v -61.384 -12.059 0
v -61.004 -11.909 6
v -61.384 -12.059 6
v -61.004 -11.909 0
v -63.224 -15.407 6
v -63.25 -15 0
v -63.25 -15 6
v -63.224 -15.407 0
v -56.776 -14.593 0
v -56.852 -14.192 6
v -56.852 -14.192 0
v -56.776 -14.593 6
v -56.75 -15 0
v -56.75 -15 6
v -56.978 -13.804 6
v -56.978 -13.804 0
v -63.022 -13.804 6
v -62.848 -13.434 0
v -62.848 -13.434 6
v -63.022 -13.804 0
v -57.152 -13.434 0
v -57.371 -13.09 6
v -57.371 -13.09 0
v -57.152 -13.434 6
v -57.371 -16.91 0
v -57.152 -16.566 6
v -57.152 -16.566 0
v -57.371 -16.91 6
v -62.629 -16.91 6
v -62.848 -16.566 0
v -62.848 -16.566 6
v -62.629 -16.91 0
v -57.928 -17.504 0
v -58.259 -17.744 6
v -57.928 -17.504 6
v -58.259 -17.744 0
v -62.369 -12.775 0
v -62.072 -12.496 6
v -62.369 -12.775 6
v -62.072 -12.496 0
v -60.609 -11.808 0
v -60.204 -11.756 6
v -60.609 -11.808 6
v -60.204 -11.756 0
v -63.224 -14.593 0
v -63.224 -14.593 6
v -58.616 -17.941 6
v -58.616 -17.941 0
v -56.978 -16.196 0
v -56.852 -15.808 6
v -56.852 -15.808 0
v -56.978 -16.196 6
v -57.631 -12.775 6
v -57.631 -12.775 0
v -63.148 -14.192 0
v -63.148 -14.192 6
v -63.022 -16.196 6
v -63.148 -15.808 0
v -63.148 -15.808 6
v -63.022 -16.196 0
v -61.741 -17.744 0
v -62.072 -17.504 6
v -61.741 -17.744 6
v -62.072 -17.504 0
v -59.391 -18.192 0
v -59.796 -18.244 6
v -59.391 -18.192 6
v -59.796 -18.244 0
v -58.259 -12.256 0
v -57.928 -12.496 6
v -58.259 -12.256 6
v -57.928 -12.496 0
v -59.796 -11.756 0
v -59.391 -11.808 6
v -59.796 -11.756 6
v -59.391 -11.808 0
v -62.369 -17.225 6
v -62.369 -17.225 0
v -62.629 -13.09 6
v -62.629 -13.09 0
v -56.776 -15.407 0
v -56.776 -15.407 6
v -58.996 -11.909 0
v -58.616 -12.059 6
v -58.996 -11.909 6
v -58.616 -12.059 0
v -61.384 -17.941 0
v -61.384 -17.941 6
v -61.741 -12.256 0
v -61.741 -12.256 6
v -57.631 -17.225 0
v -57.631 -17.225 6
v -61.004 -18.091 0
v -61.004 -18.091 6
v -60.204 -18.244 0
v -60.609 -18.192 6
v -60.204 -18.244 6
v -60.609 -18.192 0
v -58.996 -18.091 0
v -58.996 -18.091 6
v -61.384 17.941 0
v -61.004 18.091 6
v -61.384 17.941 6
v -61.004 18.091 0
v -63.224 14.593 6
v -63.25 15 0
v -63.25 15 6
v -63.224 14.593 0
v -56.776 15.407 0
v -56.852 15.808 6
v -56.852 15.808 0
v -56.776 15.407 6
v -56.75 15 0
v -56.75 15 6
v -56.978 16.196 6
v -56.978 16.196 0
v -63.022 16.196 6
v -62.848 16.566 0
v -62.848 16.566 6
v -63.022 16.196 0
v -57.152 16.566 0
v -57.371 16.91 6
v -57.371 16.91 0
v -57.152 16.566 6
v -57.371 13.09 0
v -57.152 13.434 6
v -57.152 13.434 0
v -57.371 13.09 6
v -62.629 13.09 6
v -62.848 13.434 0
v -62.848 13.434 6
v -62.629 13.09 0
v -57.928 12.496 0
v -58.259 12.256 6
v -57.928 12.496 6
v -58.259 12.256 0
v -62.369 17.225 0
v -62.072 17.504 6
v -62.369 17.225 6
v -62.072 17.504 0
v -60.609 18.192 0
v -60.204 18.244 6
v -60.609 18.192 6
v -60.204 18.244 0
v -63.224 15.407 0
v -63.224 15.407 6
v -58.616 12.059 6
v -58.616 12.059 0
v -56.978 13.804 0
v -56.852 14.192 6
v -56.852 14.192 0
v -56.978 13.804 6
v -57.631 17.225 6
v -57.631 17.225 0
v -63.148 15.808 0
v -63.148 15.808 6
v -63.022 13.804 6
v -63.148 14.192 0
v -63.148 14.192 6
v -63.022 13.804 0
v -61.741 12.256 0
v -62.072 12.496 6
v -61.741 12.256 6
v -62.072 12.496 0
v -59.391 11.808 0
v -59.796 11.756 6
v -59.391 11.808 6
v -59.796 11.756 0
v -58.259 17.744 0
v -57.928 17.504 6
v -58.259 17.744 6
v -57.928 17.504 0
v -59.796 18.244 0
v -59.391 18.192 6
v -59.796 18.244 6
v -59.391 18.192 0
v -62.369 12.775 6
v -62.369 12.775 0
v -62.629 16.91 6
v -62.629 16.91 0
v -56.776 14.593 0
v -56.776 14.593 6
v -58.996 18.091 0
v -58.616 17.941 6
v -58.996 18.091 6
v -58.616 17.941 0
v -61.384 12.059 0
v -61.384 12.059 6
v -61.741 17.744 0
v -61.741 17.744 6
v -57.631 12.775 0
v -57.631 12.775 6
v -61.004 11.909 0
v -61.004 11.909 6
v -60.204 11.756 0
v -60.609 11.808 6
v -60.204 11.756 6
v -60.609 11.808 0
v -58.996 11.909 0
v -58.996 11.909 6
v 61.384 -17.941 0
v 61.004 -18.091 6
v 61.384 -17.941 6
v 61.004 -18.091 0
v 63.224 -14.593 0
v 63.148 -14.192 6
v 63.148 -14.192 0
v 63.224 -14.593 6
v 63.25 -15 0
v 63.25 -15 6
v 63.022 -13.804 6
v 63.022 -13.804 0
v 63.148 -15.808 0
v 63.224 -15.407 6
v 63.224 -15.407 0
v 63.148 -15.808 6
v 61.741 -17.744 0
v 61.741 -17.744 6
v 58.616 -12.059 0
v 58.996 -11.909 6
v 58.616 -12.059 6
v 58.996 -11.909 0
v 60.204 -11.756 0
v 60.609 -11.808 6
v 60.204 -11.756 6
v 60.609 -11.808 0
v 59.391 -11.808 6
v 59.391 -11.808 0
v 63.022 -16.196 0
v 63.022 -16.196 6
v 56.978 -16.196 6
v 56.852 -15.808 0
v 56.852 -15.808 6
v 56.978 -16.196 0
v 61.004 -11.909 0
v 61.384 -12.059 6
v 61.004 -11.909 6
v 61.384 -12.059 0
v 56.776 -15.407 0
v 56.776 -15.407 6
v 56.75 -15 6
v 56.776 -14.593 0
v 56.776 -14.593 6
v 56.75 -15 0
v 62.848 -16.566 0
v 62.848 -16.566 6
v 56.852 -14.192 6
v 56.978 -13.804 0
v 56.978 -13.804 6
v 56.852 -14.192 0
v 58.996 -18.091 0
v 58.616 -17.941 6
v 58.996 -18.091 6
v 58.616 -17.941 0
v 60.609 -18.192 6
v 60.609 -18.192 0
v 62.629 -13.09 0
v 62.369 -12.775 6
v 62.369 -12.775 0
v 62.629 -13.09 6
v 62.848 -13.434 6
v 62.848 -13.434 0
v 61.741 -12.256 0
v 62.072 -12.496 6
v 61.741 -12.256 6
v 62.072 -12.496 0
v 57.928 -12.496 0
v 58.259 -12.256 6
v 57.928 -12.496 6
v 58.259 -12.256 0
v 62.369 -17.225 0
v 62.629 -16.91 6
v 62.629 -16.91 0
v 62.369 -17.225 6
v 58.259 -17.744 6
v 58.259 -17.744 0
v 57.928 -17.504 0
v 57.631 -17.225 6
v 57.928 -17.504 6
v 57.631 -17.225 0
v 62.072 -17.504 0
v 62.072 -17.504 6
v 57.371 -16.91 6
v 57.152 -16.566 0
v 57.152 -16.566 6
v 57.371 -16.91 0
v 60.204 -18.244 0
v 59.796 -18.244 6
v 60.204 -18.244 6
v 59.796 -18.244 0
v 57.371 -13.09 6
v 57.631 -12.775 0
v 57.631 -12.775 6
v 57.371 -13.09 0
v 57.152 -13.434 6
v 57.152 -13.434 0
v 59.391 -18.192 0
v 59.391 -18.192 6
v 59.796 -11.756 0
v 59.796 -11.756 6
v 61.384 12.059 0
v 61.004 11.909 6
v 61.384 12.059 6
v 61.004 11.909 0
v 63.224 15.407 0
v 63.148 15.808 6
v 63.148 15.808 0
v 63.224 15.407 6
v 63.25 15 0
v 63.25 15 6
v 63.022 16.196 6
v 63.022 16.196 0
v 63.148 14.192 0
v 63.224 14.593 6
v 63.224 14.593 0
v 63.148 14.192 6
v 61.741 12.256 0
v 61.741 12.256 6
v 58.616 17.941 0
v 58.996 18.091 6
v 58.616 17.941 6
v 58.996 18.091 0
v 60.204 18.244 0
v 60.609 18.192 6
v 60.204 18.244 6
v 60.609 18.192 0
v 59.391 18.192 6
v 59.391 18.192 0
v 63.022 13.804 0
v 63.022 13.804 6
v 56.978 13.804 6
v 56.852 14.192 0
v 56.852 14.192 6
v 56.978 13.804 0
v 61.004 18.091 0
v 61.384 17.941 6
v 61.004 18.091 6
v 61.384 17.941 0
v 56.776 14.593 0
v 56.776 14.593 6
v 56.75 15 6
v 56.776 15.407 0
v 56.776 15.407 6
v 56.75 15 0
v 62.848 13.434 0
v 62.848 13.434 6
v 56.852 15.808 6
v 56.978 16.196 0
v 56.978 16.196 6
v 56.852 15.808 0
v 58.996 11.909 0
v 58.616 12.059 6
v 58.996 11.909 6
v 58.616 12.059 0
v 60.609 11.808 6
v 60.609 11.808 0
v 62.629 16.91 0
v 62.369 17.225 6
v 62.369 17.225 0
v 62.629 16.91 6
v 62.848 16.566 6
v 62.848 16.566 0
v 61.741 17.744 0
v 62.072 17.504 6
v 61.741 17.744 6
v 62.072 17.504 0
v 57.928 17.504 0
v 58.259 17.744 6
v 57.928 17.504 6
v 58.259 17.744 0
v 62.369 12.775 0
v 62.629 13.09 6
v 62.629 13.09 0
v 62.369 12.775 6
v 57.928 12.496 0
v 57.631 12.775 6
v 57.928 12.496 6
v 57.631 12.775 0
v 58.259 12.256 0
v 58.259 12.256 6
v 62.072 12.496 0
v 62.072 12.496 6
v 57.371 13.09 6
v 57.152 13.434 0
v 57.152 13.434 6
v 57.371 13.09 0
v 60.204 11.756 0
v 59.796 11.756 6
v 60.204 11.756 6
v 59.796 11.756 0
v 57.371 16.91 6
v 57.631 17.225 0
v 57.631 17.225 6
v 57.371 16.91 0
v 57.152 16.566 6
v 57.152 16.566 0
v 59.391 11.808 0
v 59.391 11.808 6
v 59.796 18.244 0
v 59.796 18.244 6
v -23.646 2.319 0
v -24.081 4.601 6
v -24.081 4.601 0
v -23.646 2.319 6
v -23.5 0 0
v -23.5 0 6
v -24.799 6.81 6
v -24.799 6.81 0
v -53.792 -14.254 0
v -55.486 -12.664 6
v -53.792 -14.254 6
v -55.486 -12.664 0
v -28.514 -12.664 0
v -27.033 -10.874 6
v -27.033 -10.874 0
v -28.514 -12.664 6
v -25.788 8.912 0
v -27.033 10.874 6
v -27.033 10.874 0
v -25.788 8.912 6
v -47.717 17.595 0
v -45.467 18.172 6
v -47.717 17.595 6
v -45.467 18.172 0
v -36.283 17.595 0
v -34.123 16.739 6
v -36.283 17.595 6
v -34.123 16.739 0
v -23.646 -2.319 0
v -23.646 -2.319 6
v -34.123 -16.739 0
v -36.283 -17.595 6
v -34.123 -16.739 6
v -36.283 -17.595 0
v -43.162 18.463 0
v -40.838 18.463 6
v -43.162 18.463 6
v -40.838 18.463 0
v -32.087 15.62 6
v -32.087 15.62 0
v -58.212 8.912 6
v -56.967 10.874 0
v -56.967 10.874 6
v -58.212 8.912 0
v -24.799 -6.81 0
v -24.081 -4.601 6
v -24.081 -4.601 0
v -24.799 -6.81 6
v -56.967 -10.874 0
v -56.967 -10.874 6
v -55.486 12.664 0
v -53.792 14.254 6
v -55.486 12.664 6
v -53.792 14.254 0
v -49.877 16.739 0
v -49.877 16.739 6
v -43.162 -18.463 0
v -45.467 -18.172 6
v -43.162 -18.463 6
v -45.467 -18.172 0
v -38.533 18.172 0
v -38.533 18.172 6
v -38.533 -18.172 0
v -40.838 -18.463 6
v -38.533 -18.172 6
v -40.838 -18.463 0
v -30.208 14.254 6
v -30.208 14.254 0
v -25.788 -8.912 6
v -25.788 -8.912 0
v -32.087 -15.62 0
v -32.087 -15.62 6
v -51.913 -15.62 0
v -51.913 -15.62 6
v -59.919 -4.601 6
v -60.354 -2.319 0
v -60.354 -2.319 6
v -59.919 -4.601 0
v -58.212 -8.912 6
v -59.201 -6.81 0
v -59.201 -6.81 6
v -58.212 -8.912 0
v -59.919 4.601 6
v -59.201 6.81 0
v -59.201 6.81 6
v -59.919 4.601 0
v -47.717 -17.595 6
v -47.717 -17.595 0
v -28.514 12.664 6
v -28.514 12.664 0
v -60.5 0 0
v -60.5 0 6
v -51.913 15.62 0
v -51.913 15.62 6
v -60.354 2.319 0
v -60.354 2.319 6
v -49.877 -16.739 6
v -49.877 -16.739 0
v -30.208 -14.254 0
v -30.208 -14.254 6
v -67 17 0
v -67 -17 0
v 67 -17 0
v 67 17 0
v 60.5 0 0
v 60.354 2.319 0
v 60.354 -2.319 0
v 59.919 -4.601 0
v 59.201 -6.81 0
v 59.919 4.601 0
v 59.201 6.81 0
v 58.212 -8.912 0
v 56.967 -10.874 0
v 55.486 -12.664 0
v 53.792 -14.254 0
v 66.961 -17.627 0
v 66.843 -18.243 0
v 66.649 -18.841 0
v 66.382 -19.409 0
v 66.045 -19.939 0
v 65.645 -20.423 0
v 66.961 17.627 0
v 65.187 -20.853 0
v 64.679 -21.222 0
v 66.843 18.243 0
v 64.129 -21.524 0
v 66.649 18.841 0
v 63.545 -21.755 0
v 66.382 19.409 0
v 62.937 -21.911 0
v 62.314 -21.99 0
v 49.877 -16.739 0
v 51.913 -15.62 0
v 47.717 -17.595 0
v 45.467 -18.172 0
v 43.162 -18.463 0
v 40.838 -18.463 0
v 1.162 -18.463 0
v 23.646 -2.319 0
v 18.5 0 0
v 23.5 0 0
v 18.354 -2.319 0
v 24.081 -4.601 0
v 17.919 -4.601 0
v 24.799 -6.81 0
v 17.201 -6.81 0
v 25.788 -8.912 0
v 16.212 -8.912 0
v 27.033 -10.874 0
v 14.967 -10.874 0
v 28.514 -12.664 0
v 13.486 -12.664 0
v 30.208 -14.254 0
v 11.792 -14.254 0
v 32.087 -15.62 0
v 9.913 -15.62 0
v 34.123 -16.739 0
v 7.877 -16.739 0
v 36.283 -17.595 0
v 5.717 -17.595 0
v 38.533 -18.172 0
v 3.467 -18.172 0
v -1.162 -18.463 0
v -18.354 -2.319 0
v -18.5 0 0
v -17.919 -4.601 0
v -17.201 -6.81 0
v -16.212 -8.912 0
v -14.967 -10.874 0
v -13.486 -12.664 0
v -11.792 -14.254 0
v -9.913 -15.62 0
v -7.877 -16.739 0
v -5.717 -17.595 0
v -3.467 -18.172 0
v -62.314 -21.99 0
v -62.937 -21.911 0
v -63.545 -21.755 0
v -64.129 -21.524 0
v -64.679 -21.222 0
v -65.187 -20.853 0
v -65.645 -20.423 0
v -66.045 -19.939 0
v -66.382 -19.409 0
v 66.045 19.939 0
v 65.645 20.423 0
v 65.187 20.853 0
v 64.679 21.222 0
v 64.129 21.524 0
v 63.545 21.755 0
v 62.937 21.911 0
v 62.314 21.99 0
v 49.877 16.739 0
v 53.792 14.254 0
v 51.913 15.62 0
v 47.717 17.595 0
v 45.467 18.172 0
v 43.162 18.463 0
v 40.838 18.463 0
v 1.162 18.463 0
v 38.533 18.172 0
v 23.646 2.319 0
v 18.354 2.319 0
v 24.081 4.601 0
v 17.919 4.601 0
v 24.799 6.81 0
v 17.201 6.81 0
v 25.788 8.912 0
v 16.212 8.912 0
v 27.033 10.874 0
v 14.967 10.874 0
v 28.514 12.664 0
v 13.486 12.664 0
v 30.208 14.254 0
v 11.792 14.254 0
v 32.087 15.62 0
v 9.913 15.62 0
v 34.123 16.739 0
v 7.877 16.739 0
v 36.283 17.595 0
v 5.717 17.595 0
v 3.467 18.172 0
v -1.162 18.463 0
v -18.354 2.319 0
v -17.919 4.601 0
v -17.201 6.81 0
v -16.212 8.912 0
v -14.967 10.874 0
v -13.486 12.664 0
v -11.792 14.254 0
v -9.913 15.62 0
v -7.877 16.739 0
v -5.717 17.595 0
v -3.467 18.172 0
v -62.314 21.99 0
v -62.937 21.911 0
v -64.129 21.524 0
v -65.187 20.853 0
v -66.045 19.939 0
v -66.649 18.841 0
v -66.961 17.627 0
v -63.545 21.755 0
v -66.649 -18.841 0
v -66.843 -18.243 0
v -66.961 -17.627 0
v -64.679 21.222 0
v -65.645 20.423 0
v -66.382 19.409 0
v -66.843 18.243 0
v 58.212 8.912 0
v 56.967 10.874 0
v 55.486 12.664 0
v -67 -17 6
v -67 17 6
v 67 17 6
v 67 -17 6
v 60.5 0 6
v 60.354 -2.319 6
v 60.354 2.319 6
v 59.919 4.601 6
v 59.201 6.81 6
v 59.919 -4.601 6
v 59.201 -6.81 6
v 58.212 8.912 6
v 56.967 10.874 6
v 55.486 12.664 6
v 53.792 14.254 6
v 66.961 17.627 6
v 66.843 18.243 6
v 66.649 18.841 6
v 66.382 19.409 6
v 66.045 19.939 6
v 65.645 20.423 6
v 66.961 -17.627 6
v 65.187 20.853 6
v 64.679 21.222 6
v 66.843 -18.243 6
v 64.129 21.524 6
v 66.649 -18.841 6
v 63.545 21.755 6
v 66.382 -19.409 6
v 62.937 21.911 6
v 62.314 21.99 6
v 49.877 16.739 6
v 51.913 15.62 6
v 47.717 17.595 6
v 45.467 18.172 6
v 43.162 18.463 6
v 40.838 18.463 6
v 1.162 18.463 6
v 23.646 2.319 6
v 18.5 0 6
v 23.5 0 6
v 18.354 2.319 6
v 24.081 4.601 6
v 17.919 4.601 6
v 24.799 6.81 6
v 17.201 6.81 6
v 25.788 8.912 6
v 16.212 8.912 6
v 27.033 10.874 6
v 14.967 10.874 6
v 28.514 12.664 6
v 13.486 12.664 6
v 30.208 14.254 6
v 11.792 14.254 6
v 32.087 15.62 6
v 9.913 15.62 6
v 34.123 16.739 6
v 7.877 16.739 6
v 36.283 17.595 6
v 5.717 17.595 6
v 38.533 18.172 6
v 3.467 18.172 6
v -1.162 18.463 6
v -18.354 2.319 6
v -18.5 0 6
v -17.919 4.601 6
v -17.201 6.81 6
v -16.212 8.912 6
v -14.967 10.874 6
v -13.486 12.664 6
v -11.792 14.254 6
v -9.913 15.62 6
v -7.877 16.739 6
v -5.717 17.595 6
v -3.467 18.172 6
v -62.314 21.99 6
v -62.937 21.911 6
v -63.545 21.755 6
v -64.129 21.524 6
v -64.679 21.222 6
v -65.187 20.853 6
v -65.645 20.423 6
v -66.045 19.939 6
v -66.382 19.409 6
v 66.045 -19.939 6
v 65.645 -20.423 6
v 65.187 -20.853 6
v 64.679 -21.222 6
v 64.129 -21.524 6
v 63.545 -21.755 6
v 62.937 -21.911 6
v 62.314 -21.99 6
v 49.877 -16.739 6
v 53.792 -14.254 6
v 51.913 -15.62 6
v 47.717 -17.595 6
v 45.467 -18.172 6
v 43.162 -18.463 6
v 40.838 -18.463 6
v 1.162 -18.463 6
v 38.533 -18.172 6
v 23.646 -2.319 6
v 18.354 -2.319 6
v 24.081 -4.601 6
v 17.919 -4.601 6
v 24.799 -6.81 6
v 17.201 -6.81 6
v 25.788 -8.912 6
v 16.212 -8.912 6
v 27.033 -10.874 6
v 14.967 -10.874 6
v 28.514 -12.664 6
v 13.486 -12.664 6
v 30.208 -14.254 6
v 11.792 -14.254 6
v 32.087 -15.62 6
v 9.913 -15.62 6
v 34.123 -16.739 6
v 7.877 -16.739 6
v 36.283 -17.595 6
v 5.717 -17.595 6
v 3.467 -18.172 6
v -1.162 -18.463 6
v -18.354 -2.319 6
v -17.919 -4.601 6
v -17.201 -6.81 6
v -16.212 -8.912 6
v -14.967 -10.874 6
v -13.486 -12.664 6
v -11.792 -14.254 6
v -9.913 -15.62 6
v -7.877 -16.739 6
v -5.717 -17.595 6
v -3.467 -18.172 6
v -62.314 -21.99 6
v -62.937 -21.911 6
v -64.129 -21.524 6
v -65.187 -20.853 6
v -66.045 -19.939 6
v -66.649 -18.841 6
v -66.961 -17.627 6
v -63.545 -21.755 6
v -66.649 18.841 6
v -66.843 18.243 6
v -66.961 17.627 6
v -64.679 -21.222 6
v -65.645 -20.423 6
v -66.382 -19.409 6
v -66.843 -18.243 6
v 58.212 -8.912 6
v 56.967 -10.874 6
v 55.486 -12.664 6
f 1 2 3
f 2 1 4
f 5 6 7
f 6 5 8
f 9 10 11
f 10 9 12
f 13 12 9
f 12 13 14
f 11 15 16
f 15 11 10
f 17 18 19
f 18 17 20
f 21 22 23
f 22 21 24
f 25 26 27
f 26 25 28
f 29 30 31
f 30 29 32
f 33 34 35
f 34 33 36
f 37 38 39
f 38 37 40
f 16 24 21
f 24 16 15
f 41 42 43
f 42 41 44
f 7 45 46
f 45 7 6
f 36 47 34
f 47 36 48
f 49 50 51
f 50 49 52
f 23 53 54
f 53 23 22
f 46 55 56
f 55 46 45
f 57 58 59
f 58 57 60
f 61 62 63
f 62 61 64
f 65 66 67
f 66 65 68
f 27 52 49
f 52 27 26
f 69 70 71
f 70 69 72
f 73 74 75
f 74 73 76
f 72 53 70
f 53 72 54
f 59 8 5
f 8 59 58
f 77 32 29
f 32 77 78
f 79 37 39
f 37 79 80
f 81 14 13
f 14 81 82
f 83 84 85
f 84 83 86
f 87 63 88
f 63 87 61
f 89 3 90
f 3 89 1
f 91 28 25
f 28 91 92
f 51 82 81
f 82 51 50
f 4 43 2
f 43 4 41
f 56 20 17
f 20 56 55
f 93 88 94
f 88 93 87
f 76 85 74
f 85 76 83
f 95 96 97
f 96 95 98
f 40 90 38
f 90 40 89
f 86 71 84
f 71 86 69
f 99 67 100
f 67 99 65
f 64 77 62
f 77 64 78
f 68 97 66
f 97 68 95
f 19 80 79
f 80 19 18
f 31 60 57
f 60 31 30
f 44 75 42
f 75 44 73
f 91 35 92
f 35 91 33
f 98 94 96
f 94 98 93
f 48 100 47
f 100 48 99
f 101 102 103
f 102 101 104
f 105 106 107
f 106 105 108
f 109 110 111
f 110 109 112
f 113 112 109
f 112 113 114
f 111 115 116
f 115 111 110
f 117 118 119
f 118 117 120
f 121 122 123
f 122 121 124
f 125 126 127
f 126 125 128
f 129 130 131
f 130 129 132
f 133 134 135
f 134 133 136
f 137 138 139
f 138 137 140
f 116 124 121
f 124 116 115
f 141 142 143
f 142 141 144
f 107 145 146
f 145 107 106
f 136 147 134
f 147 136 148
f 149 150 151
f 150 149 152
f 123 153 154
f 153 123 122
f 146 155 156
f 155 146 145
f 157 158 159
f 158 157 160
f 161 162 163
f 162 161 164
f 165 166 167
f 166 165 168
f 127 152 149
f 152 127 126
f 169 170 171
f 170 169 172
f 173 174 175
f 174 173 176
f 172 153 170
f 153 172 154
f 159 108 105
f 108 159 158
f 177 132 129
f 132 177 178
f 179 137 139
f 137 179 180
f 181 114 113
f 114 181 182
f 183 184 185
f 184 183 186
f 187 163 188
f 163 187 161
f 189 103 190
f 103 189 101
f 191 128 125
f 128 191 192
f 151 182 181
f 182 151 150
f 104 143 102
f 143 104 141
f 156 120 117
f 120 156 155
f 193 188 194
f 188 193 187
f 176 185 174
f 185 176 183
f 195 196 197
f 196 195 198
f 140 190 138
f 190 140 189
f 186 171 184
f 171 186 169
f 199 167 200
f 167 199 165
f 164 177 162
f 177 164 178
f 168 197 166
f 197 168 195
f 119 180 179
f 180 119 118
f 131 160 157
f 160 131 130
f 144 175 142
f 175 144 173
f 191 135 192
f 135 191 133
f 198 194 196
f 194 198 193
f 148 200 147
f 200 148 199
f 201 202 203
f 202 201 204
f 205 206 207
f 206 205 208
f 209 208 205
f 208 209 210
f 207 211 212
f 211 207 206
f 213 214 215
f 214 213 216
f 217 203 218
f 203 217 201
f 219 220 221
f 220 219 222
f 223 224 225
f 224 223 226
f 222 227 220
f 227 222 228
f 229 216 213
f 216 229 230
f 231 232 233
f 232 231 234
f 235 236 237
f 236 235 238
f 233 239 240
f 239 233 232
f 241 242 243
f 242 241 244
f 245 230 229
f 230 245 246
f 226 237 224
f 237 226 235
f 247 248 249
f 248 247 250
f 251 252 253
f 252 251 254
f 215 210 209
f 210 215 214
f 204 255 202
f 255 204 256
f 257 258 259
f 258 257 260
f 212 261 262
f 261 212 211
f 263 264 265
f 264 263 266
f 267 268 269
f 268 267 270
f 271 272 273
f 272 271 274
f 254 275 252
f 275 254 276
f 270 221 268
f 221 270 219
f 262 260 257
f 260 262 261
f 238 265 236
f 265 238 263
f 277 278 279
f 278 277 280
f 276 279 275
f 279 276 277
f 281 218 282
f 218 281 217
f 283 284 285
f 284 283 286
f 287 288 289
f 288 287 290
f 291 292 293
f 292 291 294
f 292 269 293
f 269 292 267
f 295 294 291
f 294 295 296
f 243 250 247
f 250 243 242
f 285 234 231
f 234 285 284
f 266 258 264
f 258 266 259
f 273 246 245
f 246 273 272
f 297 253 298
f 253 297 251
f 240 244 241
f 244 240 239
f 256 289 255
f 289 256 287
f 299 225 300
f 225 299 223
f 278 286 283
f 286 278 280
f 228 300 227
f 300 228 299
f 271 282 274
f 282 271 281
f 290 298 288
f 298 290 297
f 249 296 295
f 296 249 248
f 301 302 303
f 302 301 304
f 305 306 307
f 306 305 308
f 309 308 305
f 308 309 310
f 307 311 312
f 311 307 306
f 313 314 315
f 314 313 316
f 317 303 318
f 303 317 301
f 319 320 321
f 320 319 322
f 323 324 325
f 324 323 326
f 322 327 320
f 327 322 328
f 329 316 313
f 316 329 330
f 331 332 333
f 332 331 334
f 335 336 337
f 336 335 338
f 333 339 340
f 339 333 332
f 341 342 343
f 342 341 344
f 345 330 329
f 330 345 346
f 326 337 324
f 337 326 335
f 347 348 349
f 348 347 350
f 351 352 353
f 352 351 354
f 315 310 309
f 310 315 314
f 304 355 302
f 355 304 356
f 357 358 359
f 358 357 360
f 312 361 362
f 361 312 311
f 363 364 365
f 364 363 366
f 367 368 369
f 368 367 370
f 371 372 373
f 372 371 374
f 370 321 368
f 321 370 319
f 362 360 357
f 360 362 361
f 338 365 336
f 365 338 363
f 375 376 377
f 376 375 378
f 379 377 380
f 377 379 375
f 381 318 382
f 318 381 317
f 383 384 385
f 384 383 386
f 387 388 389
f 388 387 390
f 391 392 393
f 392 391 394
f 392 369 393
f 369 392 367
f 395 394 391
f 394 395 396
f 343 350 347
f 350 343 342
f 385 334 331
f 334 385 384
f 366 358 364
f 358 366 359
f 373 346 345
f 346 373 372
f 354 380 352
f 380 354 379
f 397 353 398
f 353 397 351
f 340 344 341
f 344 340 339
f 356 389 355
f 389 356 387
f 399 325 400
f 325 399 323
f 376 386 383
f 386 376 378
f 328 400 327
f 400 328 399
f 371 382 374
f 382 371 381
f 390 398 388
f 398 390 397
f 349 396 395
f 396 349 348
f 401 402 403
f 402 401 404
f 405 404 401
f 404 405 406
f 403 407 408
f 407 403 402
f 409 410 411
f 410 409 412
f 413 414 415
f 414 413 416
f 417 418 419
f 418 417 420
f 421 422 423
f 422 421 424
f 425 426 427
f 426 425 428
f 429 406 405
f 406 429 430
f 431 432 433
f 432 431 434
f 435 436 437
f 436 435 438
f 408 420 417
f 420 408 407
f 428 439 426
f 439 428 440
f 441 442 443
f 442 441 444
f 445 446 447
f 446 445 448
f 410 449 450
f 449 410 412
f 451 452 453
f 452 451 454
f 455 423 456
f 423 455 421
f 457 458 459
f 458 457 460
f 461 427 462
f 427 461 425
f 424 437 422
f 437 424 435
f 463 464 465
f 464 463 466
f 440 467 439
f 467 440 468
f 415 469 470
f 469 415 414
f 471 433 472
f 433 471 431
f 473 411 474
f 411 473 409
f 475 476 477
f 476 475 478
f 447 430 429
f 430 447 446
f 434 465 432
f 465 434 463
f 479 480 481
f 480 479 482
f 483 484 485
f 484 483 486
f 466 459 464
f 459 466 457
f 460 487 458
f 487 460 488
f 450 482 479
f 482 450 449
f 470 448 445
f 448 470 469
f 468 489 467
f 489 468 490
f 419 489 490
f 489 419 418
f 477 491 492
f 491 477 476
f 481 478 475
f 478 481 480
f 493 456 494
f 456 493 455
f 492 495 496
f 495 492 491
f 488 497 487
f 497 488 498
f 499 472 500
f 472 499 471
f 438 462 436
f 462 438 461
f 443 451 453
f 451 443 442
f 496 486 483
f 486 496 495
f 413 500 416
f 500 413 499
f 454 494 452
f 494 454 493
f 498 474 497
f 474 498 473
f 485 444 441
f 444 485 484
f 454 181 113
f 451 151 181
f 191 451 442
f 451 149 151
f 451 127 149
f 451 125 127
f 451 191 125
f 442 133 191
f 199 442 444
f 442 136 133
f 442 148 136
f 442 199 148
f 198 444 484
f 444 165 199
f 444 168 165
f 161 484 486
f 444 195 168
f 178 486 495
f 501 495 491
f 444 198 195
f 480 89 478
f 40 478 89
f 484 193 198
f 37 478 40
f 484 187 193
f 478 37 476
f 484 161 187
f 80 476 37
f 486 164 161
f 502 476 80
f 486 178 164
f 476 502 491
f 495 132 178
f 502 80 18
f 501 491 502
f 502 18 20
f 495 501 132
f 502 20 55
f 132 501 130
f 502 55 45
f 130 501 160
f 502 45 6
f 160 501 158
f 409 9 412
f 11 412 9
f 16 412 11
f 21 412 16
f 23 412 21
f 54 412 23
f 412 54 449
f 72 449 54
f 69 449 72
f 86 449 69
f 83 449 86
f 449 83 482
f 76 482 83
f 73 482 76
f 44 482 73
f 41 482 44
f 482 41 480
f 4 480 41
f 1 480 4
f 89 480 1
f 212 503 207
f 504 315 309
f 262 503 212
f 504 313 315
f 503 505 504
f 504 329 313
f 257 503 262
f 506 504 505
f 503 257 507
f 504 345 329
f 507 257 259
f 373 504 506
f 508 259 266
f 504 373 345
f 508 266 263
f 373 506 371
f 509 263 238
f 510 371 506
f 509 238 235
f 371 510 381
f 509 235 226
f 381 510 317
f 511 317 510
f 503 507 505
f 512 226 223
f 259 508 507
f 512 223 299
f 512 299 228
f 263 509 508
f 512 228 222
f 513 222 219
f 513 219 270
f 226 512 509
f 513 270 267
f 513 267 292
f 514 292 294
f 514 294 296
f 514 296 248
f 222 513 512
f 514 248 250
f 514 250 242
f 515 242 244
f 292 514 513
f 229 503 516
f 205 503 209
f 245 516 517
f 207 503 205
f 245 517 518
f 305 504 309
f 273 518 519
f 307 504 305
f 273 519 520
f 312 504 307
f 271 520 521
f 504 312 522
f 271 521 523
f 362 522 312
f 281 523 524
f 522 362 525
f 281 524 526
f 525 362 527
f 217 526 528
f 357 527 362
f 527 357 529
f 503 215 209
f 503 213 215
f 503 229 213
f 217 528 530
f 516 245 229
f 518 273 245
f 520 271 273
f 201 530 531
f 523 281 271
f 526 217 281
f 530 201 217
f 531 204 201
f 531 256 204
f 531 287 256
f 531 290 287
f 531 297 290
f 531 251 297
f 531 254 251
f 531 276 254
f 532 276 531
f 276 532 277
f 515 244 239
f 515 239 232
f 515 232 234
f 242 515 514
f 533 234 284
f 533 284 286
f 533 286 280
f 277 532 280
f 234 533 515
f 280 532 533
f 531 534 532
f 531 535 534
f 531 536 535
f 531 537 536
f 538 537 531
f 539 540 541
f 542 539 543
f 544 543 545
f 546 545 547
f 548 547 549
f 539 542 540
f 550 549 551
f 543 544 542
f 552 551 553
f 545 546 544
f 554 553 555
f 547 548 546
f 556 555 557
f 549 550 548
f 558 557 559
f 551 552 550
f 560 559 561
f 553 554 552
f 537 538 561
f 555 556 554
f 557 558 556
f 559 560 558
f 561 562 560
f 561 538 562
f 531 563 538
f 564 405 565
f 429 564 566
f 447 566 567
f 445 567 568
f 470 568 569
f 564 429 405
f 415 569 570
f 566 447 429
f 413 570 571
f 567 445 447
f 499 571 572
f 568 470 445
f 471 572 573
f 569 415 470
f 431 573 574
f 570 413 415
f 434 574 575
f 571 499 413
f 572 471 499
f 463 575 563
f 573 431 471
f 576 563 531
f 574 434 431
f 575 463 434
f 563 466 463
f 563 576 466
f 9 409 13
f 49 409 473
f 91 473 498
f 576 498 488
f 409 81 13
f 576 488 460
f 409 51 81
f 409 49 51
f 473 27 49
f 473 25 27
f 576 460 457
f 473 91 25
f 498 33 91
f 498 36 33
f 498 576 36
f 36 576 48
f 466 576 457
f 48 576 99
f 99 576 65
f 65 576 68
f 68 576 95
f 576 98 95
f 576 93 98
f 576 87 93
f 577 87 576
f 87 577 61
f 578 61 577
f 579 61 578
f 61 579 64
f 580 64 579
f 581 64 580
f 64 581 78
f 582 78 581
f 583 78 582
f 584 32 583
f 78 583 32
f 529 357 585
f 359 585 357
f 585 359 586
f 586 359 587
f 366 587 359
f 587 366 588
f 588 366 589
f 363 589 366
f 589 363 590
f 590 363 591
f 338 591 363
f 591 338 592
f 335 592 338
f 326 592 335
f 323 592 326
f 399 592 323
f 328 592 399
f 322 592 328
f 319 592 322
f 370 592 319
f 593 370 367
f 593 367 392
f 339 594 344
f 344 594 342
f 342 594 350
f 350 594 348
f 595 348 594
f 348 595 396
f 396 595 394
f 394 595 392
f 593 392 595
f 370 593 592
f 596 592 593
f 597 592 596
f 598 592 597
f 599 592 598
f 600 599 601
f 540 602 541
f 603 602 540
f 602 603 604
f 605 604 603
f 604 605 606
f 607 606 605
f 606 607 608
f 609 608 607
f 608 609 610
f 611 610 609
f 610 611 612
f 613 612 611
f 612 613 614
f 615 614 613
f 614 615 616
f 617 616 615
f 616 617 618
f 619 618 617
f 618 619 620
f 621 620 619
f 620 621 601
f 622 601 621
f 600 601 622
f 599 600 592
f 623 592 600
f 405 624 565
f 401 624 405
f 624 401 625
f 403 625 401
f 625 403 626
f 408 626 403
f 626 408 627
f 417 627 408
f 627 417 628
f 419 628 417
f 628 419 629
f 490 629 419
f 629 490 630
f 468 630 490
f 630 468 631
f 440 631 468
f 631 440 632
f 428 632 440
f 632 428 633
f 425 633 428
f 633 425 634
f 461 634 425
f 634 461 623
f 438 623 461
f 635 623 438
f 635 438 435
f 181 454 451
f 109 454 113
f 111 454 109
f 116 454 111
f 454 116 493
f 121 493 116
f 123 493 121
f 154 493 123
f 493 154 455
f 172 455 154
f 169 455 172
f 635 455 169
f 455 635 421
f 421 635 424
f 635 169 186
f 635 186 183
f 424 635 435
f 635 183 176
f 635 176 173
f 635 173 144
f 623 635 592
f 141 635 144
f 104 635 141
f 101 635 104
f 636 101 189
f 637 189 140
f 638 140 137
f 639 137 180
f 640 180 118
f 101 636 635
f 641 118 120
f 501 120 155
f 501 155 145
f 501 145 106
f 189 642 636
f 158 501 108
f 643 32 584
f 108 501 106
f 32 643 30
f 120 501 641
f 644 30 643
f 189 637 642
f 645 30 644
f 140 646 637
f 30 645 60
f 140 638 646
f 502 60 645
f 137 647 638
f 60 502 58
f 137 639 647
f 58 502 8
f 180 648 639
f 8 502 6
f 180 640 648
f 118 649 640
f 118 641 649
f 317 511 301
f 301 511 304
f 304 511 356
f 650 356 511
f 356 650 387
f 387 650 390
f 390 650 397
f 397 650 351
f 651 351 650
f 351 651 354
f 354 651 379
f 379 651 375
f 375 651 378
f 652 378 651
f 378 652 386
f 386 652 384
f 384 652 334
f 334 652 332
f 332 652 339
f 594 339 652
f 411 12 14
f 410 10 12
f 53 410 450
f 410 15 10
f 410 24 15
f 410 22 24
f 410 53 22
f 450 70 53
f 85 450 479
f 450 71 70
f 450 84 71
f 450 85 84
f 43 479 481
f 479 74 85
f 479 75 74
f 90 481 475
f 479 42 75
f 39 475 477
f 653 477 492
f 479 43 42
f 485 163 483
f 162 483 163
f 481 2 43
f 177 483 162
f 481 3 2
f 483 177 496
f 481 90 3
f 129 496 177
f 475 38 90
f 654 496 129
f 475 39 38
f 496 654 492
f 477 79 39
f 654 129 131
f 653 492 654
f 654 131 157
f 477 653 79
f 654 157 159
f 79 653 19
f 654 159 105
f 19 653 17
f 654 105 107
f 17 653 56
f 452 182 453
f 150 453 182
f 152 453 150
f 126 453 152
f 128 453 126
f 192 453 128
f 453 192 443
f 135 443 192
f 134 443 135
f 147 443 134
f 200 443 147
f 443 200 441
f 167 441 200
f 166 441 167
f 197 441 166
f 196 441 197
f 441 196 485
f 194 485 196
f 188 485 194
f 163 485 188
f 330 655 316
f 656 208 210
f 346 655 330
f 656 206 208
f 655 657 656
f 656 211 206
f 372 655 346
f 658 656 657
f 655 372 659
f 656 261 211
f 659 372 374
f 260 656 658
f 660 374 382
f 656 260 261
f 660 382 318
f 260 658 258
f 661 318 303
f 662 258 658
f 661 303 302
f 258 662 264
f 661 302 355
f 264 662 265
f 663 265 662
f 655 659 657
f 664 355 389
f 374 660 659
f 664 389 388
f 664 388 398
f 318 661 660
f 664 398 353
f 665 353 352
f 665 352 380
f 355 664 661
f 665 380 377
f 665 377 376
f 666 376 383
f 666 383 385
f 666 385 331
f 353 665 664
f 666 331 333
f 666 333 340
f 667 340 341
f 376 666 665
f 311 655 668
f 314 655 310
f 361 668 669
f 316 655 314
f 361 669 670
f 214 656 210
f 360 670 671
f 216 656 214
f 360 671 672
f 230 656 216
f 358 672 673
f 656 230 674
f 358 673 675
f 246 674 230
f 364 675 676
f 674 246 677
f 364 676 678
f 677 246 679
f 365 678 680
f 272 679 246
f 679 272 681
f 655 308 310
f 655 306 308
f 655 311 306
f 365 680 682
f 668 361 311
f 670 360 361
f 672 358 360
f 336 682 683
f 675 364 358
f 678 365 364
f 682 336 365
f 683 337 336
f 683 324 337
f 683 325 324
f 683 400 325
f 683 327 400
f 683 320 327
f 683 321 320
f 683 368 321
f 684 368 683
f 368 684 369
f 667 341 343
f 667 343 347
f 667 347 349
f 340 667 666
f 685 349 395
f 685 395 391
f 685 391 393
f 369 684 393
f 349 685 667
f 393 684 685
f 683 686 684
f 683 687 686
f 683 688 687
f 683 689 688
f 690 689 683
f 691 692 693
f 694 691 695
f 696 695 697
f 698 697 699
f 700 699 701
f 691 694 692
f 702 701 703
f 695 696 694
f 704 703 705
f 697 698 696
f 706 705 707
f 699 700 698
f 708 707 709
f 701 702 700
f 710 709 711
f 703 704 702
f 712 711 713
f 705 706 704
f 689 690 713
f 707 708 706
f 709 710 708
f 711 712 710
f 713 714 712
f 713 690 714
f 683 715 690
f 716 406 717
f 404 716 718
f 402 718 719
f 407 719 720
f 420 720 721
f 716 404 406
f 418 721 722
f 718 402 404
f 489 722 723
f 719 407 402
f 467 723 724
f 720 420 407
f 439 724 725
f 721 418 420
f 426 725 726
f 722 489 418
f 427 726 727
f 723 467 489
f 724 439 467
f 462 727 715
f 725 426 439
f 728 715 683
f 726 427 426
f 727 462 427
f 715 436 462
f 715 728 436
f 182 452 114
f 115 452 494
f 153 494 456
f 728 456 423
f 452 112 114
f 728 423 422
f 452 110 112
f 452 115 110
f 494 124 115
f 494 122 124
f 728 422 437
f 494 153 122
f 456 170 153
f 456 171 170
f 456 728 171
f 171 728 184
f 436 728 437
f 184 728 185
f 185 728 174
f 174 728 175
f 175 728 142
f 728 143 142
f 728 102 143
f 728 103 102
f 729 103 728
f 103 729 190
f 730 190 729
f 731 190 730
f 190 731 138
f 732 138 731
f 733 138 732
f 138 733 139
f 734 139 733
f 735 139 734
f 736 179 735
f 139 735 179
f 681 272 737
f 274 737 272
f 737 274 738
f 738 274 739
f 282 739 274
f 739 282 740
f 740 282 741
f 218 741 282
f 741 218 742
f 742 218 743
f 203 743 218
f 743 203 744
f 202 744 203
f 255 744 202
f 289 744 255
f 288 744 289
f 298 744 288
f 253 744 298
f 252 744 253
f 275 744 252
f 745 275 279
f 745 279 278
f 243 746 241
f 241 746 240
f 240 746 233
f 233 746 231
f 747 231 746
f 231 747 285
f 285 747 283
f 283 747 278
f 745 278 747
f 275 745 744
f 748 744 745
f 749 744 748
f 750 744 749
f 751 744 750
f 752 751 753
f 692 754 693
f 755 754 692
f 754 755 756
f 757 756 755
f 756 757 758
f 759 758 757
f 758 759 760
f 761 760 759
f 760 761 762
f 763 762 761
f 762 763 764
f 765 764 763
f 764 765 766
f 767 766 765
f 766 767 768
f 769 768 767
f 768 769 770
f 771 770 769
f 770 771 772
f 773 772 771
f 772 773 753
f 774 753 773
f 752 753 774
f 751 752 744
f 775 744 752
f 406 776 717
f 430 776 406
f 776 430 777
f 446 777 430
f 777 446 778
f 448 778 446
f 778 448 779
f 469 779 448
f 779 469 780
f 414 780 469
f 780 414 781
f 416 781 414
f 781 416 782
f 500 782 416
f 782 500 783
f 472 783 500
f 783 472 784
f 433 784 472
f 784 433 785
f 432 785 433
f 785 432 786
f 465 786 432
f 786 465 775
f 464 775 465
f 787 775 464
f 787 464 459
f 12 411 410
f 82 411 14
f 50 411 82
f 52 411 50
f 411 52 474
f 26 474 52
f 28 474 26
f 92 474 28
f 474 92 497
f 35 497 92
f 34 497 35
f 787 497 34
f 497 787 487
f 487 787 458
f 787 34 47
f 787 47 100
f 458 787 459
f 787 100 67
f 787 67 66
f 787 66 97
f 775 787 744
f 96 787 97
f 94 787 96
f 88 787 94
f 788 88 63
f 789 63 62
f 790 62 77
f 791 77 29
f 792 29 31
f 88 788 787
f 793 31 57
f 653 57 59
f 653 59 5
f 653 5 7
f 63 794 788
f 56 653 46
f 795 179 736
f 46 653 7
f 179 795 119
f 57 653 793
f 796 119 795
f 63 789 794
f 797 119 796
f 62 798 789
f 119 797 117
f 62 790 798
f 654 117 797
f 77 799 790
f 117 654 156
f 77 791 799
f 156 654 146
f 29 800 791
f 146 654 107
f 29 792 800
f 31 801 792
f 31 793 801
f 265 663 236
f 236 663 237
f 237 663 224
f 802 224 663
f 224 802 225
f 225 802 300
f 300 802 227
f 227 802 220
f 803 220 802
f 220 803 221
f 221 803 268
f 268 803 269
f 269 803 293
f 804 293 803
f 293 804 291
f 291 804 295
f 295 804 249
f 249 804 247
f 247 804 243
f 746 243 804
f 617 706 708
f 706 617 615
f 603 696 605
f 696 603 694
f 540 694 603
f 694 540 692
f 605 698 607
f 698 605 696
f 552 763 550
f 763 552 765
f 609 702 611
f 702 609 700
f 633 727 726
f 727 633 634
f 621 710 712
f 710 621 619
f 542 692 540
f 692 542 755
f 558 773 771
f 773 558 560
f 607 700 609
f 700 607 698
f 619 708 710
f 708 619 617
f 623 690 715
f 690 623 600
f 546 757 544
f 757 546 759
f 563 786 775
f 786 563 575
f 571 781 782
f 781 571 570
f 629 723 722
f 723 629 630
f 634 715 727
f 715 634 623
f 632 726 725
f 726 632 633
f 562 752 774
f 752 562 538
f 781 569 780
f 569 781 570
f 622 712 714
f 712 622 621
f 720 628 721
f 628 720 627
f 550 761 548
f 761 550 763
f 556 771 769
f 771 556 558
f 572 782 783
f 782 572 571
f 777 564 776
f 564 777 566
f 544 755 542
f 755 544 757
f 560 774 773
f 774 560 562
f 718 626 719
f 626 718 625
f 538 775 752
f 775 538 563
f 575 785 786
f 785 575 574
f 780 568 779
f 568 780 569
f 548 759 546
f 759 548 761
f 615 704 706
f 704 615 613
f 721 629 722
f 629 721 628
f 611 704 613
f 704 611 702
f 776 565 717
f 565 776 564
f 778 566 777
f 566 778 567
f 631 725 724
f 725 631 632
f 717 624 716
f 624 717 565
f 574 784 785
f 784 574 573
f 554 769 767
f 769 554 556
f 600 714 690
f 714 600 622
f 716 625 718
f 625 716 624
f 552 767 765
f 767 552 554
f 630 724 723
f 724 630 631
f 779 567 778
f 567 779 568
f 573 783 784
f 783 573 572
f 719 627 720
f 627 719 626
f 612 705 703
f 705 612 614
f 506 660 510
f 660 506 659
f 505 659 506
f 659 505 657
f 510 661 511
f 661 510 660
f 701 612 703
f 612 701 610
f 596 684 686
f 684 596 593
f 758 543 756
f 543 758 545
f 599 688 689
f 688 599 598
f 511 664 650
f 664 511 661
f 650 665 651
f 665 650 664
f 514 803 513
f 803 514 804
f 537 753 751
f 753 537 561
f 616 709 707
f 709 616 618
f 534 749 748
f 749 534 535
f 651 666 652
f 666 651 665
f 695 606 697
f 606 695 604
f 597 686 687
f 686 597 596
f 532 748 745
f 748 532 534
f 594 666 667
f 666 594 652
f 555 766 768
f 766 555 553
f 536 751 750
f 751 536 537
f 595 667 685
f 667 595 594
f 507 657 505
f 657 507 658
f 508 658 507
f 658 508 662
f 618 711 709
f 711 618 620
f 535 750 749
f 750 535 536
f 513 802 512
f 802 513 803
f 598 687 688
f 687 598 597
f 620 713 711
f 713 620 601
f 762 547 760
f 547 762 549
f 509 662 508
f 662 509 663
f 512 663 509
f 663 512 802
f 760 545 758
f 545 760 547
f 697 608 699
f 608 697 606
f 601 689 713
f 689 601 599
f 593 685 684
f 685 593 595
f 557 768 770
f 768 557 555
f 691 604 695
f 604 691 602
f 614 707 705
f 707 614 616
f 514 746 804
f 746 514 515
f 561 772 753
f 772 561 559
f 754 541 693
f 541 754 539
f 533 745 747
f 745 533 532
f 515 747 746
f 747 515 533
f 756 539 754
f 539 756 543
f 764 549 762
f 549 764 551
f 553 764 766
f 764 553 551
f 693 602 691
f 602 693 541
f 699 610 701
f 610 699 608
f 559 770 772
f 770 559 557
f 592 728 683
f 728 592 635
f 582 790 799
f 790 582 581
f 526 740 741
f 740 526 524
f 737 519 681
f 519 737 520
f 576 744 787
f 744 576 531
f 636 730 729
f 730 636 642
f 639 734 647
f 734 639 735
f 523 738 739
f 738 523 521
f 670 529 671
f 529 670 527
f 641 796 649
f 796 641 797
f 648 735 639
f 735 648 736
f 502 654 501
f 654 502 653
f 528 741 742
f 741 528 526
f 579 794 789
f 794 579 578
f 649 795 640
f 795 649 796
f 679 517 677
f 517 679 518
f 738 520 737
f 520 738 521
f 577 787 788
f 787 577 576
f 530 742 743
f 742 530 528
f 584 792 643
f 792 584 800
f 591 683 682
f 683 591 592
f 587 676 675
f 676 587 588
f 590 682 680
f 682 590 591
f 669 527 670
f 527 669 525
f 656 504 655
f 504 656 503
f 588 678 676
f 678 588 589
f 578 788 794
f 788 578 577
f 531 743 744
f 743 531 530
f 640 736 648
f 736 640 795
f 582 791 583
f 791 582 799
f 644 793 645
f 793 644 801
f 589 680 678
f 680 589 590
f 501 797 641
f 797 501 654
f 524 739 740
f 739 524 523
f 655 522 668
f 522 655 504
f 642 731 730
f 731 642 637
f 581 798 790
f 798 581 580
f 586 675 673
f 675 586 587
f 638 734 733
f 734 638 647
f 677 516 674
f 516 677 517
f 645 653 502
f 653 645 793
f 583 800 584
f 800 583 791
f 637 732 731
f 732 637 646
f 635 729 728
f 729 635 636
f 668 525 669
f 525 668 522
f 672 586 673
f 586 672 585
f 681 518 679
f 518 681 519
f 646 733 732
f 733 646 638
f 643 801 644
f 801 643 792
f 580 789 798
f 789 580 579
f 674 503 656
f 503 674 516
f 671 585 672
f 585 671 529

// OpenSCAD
$fn = 50;

difference() {
	union() {
		hull() {
			translate(v = [-62.0, 17.0, 0]) {
				cylinder(h = 6, r = 5);
			}
			translate(v = [62.0, 17.0, 0]) {
				cylinder(h = 6, r = 5);
			}
			translate(v = [-62.0, -17.0, 0]) {
				cylinder(h = 6, r = 5);
			}
			translate(v = [62.0, -17.0, 0]) {
				cylinder(h = 6, r = 5);
			}
		}
	}
	union() {
		translate(v = [-60.0, -15.0, -100.0]) {
			cylinder(h = 200, r = 3.25);
		}
		translate(v = [-60.0, 15.0, -100.0]) {
			cylinder(h = 200, r = 3.25);
		}
		translate(v = [60.0, -15.0, -100.0]) {
			cylinder(h = 200, r = 3.25);
		}
		translate(v = [60.0, 15.0, -100.0]) {
			cylinder(h = 200, r = 3.25);
		}
		translate(v = [-60.0, -15.0, -100.0]) {
			cylinder(h = 200, r = 1.8);
		}
		translate(v = [-60.0, 15.0, -100.0]) {
			cylinder(h = 200, r = 1.8);
		}
		translate(v = [60.0, -15.0, -100.0]) {
			cylinder(h = 200, r = 1.8);
		}
		translate(v = [60.0, 15.0, -100.0]) {
			cylinder(h = 200, r = 1.8);
		}
		translate(v = [-42.0, 0, 0.0]) {
			cylinder(h = 6, r = 18.5);
		}
		cylinder(h = 6, r = 18.5);
		translate(v = [42.0, 0, 0.0]) {
			cylinder(h = 6, r = 18.5);
		}
	}
}
